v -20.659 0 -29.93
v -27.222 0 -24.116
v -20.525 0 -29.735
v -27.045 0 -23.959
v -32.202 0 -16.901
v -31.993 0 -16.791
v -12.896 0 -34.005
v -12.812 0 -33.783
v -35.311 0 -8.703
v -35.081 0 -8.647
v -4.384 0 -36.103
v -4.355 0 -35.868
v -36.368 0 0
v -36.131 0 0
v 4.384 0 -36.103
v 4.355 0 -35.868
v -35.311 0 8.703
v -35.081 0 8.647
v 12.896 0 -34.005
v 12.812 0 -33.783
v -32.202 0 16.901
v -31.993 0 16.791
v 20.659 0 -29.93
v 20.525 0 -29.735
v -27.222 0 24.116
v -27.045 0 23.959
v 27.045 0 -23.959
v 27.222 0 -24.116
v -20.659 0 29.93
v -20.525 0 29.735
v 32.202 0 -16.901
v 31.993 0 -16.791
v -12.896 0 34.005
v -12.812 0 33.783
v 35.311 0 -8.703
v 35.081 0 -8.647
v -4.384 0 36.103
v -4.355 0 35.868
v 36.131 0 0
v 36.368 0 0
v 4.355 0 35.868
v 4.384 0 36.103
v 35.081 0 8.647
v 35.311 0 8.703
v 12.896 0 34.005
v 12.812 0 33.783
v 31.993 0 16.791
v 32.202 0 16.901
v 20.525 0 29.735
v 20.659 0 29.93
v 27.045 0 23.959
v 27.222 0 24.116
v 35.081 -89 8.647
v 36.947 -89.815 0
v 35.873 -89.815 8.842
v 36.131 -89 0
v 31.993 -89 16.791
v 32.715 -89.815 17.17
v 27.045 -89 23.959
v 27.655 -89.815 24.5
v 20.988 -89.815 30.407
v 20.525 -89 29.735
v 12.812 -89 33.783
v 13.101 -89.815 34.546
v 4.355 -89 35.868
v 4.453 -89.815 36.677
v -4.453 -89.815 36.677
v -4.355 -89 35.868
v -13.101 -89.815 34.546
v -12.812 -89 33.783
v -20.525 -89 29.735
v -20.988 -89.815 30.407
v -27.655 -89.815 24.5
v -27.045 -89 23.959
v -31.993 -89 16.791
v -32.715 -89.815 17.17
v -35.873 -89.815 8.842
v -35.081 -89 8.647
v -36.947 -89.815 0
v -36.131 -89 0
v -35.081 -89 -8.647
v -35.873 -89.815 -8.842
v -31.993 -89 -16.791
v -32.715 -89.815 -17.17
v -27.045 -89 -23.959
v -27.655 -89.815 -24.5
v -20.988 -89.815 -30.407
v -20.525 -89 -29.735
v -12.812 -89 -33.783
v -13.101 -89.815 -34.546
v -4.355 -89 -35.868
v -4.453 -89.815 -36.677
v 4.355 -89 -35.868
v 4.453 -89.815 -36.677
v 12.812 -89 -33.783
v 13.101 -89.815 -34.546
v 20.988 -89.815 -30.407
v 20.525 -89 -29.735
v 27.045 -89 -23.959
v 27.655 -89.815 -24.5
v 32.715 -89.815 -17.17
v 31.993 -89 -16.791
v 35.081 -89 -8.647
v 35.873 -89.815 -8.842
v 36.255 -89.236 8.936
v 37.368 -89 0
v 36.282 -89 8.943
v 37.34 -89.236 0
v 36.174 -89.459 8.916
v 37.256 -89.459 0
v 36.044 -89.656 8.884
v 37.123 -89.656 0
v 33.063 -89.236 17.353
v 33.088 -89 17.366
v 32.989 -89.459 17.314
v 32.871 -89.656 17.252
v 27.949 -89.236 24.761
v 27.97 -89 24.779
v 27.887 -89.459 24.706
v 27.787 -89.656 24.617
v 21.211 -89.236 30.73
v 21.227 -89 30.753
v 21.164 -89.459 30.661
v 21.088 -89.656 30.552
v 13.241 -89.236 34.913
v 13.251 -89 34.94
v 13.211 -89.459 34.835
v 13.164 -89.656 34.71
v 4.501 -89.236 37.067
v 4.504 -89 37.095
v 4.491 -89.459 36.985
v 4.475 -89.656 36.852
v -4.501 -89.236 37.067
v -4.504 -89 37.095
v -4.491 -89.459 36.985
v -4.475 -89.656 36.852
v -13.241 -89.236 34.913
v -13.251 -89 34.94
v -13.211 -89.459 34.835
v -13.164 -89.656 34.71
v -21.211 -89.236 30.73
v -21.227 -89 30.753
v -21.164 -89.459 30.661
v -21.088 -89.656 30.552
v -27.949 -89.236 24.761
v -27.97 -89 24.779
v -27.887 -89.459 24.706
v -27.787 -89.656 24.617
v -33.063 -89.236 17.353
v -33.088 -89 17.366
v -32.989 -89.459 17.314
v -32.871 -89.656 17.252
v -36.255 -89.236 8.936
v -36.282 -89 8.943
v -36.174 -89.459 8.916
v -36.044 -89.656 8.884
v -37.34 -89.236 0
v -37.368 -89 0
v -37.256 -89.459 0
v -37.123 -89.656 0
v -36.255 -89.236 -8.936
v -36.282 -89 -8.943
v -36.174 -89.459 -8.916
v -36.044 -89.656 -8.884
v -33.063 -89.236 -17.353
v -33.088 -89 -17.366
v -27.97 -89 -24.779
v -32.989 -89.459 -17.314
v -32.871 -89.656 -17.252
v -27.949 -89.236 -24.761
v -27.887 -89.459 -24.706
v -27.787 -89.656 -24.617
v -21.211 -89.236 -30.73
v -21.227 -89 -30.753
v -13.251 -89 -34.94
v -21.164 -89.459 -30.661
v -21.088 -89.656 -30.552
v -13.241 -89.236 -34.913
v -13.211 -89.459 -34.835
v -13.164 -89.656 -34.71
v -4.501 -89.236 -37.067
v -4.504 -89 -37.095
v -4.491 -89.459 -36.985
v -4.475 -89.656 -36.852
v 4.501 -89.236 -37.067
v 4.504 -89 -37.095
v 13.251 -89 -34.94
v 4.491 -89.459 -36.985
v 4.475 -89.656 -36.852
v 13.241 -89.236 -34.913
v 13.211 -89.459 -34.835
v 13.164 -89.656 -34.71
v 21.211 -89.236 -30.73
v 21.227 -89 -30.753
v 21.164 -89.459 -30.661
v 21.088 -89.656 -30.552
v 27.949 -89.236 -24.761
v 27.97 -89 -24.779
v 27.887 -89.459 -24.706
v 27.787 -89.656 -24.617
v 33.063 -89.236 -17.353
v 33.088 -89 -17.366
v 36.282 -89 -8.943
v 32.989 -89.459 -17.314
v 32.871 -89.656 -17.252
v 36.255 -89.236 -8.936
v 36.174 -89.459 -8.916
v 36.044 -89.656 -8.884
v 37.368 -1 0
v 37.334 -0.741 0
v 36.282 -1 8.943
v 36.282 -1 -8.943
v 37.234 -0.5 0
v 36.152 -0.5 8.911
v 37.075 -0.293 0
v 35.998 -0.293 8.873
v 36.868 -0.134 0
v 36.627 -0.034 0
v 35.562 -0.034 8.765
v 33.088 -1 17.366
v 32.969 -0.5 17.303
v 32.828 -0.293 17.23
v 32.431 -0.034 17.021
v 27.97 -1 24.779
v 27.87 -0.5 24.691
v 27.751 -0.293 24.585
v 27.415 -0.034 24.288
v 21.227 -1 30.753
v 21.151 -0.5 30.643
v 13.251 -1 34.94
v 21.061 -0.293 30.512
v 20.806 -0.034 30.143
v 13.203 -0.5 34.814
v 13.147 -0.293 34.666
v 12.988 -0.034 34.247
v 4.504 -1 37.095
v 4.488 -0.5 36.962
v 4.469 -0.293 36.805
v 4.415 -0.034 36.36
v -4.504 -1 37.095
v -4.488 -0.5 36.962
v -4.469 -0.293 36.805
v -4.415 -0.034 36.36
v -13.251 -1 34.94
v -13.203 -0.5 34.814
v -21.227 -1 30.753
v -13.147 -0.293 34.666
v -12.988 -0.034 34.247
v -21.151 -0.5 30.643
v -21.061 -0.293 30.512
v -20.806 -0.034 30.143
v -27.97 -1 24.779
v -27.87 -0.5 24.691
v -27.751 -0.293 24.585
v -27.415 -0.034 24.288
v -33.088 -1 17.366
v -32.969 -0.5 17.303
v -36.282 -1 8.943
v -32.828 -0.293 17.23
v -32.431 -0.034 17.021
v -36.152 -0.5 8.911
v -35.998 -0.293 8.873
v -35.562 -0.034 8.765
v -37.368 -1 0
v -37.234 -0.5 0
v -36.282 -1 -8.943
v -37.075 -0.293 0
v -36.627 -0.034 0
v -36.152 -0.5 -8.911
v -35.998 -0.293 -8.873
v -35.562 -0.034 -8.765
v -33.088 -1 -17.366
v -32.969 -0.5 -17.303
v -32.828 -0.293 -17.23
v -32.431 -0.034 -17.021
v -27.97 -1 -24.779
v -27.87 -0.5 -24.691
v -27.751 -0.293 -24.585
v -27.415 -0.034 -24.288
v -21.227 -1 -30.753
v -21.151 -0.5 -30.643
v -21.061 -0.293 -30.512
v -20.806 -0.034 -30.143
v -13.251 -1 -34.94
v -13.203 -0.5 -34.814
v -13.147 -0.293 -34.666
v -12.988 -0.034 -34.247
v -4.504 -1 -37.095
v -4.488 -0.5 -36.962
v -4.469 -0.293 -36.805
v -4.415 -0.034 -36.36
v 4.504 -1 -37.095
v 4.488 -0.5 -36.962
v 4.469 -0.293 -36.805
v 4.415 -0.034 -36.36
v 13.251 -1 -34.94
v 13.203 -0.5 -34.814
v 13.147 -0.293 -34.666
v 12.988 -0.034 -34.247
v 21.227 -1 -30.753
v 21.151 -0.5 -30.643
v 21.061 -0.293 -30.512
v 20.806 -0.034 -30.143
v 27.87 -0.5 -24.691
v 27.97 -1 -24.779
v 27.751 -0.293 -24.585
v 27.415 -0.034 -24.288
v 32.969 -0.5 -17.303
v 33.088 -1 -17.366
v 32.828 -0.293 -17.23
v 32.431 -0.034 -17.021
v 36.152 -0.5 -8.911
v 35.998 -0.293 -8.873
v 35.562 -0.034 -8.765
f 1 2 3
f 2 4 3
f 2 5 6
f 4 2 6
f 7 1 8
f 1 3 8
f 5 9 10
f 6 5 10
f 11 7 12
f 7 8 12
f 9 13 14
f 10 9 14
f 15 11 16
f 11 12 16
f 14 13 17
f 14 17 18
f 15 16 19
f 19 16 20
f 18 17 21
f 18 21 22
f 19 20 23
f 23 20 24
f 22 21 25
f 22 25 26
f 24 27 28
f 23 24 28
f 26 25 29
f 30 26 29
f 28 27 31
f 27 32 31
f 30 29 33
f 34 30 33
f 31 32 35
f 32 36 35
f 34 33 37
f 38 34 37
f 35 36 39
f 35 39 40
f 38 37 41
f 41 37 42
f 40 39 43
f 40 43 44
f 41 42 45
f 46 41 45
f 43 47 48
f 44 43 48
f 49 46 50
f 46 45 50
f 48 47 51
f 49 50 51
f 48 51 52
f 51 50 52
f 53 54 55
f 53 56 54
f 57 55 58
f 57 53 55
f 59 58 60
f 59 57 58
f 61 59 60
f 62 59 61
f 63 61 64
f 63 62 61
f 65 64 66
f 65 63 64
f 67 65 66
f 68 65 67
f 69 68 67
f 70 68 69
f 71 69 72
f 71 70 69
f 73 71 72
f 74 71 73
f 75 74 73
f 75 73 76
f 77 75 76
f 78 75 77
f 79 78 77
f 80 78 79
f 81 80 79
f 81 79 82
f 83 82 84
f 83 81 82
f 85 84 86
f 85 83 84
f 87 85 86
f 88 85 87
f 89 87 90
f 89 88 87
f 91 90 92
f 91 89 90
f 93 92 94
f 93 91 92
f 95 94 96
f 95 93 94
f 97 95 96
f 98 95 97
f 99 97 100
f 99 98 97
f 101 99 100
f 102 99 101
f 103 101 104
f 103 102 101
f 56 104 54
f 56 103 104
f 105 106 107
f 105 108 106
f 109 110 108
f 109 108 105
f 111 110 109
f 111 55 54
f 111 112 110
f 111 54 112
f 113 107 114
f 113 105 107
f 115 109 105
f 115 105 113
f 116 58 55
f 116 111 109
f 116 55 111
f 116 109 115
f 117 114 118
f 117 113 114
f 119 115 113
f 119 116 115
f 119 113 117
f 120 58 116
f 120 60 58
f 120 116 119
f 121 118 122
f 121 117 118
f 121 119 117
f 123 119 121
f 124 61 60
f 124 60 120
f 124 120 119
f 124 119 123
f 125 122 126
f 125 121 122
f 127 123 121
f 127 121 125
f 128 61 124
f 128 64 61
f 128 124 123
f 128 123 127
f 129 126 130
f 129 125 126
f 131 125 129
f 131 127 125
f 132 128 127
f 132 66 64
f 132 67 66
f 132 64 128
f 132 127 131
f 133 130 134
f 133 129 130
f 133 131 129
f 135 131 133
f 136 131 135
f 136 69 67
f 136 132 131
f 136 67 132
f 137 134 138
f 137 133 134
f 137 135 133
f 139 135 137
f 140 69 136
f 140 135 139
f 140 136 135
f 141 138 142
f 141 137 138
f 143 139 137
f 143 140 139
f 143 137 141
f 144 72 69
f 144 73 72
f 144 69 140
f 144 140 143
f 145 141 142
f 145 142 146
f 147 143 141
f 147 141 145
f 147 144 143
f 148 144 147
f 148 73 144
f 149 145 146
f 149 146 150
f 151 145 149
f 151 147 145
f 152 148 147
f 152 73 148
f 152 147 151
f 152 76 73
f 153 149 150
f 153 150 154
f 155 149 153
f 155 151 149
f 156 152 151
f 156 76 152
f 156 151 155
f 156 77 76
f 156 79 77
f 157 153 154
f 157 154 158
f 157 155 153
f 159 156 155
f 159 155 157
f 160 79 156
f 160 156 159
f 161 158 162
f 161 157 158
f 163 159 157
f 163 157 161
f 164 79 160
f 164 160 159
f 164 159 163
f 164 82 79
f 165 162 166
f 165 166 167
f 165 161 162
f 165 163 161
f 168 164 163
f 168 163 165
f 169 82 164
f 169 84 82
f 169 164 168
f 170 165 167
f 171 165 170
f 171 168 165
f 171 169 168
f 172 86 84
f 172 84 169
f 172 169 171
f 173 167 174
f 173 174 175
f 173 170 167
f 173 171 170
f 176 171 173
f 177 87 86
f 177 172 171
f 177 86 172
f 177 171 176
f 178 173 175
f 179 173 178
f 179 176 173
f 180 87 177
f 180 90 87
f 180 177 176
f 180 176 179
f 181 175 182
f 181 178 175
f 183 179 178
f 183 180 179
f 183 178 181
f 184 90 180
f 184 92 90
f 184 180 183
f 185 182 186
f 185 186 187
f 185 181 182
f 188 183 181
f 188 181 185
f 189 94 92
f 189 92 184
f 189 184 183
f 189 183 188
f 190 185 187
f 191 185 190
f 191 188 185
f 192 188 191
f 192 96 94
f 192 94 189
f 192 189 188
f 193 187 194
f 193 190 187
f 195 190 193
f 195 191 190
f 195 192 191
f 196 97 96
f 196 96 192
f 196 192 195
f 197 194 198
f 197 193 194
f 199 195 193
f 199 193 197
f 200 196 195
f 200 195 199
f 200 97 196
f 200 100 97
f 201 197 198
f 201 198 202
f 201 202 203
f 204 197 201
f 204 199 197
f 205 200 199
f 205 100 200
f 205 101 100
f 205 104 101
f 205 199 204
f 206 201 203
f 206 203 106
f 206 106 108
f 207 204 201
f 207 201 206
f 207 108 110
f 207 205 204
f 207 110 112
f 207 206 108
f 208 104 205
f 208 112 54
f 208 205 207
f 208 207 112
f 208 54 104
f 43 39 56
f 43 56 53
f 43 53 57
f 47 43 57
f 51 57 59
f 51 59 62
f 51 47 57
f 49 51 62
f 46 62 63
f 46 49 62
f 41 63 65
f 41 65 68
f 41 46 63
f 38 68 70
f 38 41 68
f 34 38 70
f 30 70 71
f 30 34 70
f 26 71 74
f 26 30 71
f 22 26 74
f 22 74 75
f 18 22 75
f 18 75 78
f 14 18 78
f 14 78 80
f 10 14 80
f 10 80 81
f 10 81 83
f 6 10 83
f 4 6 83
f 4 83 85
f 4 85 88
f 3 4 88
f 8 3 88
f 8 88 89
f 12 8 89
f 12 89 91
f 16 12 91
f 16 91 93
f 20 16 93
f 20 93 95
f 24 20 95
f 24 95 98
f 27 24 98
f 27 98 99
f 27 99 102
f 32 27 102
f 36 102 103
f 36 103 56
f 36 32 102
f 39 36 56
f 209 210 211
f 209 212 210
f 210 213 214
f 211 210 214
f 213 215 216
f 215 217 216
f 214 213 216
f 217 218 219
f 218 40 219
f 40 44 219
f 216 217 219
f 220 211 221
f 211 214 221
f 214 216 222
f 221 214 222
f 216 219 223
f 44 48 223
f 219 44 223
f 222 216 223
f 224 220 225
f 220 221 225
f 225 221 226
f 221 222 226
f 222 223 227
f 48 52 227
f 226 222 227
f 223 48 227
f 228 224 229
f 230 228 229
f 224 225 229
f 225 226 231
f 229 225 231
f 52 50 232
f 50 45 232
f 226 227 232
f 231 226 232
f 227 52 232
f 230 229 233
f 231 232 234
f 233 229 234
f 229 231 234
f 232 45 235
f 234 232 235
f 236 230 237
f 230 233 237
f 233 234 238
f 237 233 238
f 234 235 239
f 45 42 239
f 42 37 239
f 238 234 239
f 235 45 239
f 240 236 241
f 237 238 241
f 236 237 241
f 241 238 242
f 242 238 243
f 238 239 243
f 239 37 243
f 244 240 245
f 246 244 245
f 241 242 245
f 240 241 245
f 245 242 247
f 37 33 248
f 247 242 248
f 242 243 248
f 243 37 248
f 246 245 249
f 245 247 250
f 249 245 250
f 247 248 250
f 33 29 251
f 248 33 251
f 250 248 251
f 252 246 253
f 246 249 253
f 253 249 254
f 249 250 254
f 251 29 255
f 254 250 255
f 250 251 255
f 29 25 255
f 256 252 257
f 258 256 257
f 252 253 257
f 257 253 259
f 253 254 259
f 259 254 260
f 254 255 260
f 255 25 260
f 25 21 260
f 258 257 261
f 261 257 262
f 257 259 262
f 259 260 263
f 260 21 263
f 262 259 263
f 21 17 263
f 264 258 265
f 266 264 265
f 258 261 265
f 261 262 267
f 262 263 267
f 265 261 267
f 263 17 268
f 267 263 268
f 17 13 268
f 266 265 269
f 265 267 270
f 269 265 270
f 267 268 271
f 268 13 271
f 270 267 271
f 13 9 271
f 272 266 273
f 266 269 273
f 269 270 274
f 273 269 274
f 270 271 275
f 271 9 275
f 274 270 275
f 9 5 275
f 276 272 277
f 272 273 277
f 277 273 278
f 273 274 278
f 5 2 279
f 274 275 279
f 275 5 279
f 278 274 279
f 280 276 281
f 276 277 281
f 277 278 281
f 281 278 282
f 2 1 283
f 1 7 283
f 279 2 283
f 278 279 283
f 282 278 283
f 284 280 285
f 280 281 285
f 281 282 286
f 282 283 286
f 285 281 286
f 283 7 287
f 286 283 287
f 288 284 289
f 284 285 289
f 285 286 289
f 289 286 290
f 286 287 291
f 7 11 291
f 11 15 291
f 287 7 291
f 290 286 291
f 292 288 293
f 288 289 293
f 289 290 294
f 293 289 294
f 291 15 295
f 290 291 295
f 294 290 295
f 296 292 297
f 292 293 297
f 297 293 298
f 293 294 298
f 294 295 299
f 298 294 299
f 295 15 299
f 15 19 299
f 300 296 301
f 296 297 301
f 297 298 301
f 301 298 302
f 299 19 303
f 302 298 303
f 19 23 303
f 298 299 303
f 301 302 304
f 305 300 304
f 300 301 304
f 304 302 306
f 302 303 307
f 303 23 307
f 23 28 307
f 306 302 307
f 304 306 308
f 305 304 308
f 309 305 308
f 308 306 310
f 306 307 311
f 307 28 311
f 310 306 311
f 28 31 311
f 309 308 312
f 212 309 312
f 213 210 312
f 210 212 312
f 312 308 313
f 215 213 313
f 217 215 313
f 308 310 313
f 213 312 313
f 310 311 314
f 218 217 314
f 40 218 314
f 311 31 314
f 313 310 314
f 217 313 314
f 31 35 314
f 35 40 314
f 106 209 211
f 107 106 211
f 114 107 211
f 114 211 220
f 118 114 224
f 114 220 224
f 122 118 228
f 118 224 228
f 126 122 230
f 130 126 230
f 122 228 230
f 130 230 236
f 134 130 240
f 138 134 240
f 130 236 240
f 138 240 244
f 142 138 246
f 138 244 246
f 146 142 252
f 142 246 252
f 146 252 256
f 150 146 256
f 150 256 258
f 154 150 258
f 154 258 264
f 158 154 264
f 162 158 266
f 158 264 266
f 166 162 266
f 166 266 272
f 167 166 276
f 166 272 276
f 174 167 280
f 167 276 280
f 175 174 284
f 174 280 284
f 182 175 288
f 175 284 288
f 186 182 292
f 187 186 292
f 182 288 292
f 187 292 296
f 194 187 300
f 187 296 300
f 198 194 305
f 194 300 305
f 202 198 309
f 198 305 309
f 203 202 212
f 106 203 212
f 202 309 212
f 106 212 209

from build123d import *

# Parameters (mm, degrees)
F0_R     = 37.3678316612
F0_R_2   = 36.1312756735
F1_DEPTH = 90
F2_R     = 1


# Not quite as in the source:
# - a fillet or chamfer that OpenCascade refuses, or shapes differently, is made with other operations: its cross-section is extruded or revolved along the edge and cut away or added


with BuildPart() as f1:
    # F0 (on Front) → F1 (new body)
    with BuildSketch(Plane.XZ):
        Circle(F0_R)
        Circle(F0_R_2, mode=Mode.SUBTRACT)
    extrude(amount=F1_DEPTH)

    # F2
    f2_edges = [f1.edges().sort_by_distance(p)[0] for p in [
        (37.367832, -45, 0),
        (-37.367832, 0, 0),
        (-37.367832, -90, 0),
    ]]
    fillet(f2_edges, radius=F2_R)

    # F3: chamfer of 1 on 2 edges, made by hand

    # F3_s1 → F3_t2 (revolve, cut)
    with BuildSketch(Plane.XY):
        Polygon((37.1312756735, -90), (36.1312756735, -89), (36.1312756735, -90), align=None)
    revolve(axis=Axis((0, -90, 0), (0, -1, 0)), mode=Mode.SUBTRACT)


solid = f1.part
